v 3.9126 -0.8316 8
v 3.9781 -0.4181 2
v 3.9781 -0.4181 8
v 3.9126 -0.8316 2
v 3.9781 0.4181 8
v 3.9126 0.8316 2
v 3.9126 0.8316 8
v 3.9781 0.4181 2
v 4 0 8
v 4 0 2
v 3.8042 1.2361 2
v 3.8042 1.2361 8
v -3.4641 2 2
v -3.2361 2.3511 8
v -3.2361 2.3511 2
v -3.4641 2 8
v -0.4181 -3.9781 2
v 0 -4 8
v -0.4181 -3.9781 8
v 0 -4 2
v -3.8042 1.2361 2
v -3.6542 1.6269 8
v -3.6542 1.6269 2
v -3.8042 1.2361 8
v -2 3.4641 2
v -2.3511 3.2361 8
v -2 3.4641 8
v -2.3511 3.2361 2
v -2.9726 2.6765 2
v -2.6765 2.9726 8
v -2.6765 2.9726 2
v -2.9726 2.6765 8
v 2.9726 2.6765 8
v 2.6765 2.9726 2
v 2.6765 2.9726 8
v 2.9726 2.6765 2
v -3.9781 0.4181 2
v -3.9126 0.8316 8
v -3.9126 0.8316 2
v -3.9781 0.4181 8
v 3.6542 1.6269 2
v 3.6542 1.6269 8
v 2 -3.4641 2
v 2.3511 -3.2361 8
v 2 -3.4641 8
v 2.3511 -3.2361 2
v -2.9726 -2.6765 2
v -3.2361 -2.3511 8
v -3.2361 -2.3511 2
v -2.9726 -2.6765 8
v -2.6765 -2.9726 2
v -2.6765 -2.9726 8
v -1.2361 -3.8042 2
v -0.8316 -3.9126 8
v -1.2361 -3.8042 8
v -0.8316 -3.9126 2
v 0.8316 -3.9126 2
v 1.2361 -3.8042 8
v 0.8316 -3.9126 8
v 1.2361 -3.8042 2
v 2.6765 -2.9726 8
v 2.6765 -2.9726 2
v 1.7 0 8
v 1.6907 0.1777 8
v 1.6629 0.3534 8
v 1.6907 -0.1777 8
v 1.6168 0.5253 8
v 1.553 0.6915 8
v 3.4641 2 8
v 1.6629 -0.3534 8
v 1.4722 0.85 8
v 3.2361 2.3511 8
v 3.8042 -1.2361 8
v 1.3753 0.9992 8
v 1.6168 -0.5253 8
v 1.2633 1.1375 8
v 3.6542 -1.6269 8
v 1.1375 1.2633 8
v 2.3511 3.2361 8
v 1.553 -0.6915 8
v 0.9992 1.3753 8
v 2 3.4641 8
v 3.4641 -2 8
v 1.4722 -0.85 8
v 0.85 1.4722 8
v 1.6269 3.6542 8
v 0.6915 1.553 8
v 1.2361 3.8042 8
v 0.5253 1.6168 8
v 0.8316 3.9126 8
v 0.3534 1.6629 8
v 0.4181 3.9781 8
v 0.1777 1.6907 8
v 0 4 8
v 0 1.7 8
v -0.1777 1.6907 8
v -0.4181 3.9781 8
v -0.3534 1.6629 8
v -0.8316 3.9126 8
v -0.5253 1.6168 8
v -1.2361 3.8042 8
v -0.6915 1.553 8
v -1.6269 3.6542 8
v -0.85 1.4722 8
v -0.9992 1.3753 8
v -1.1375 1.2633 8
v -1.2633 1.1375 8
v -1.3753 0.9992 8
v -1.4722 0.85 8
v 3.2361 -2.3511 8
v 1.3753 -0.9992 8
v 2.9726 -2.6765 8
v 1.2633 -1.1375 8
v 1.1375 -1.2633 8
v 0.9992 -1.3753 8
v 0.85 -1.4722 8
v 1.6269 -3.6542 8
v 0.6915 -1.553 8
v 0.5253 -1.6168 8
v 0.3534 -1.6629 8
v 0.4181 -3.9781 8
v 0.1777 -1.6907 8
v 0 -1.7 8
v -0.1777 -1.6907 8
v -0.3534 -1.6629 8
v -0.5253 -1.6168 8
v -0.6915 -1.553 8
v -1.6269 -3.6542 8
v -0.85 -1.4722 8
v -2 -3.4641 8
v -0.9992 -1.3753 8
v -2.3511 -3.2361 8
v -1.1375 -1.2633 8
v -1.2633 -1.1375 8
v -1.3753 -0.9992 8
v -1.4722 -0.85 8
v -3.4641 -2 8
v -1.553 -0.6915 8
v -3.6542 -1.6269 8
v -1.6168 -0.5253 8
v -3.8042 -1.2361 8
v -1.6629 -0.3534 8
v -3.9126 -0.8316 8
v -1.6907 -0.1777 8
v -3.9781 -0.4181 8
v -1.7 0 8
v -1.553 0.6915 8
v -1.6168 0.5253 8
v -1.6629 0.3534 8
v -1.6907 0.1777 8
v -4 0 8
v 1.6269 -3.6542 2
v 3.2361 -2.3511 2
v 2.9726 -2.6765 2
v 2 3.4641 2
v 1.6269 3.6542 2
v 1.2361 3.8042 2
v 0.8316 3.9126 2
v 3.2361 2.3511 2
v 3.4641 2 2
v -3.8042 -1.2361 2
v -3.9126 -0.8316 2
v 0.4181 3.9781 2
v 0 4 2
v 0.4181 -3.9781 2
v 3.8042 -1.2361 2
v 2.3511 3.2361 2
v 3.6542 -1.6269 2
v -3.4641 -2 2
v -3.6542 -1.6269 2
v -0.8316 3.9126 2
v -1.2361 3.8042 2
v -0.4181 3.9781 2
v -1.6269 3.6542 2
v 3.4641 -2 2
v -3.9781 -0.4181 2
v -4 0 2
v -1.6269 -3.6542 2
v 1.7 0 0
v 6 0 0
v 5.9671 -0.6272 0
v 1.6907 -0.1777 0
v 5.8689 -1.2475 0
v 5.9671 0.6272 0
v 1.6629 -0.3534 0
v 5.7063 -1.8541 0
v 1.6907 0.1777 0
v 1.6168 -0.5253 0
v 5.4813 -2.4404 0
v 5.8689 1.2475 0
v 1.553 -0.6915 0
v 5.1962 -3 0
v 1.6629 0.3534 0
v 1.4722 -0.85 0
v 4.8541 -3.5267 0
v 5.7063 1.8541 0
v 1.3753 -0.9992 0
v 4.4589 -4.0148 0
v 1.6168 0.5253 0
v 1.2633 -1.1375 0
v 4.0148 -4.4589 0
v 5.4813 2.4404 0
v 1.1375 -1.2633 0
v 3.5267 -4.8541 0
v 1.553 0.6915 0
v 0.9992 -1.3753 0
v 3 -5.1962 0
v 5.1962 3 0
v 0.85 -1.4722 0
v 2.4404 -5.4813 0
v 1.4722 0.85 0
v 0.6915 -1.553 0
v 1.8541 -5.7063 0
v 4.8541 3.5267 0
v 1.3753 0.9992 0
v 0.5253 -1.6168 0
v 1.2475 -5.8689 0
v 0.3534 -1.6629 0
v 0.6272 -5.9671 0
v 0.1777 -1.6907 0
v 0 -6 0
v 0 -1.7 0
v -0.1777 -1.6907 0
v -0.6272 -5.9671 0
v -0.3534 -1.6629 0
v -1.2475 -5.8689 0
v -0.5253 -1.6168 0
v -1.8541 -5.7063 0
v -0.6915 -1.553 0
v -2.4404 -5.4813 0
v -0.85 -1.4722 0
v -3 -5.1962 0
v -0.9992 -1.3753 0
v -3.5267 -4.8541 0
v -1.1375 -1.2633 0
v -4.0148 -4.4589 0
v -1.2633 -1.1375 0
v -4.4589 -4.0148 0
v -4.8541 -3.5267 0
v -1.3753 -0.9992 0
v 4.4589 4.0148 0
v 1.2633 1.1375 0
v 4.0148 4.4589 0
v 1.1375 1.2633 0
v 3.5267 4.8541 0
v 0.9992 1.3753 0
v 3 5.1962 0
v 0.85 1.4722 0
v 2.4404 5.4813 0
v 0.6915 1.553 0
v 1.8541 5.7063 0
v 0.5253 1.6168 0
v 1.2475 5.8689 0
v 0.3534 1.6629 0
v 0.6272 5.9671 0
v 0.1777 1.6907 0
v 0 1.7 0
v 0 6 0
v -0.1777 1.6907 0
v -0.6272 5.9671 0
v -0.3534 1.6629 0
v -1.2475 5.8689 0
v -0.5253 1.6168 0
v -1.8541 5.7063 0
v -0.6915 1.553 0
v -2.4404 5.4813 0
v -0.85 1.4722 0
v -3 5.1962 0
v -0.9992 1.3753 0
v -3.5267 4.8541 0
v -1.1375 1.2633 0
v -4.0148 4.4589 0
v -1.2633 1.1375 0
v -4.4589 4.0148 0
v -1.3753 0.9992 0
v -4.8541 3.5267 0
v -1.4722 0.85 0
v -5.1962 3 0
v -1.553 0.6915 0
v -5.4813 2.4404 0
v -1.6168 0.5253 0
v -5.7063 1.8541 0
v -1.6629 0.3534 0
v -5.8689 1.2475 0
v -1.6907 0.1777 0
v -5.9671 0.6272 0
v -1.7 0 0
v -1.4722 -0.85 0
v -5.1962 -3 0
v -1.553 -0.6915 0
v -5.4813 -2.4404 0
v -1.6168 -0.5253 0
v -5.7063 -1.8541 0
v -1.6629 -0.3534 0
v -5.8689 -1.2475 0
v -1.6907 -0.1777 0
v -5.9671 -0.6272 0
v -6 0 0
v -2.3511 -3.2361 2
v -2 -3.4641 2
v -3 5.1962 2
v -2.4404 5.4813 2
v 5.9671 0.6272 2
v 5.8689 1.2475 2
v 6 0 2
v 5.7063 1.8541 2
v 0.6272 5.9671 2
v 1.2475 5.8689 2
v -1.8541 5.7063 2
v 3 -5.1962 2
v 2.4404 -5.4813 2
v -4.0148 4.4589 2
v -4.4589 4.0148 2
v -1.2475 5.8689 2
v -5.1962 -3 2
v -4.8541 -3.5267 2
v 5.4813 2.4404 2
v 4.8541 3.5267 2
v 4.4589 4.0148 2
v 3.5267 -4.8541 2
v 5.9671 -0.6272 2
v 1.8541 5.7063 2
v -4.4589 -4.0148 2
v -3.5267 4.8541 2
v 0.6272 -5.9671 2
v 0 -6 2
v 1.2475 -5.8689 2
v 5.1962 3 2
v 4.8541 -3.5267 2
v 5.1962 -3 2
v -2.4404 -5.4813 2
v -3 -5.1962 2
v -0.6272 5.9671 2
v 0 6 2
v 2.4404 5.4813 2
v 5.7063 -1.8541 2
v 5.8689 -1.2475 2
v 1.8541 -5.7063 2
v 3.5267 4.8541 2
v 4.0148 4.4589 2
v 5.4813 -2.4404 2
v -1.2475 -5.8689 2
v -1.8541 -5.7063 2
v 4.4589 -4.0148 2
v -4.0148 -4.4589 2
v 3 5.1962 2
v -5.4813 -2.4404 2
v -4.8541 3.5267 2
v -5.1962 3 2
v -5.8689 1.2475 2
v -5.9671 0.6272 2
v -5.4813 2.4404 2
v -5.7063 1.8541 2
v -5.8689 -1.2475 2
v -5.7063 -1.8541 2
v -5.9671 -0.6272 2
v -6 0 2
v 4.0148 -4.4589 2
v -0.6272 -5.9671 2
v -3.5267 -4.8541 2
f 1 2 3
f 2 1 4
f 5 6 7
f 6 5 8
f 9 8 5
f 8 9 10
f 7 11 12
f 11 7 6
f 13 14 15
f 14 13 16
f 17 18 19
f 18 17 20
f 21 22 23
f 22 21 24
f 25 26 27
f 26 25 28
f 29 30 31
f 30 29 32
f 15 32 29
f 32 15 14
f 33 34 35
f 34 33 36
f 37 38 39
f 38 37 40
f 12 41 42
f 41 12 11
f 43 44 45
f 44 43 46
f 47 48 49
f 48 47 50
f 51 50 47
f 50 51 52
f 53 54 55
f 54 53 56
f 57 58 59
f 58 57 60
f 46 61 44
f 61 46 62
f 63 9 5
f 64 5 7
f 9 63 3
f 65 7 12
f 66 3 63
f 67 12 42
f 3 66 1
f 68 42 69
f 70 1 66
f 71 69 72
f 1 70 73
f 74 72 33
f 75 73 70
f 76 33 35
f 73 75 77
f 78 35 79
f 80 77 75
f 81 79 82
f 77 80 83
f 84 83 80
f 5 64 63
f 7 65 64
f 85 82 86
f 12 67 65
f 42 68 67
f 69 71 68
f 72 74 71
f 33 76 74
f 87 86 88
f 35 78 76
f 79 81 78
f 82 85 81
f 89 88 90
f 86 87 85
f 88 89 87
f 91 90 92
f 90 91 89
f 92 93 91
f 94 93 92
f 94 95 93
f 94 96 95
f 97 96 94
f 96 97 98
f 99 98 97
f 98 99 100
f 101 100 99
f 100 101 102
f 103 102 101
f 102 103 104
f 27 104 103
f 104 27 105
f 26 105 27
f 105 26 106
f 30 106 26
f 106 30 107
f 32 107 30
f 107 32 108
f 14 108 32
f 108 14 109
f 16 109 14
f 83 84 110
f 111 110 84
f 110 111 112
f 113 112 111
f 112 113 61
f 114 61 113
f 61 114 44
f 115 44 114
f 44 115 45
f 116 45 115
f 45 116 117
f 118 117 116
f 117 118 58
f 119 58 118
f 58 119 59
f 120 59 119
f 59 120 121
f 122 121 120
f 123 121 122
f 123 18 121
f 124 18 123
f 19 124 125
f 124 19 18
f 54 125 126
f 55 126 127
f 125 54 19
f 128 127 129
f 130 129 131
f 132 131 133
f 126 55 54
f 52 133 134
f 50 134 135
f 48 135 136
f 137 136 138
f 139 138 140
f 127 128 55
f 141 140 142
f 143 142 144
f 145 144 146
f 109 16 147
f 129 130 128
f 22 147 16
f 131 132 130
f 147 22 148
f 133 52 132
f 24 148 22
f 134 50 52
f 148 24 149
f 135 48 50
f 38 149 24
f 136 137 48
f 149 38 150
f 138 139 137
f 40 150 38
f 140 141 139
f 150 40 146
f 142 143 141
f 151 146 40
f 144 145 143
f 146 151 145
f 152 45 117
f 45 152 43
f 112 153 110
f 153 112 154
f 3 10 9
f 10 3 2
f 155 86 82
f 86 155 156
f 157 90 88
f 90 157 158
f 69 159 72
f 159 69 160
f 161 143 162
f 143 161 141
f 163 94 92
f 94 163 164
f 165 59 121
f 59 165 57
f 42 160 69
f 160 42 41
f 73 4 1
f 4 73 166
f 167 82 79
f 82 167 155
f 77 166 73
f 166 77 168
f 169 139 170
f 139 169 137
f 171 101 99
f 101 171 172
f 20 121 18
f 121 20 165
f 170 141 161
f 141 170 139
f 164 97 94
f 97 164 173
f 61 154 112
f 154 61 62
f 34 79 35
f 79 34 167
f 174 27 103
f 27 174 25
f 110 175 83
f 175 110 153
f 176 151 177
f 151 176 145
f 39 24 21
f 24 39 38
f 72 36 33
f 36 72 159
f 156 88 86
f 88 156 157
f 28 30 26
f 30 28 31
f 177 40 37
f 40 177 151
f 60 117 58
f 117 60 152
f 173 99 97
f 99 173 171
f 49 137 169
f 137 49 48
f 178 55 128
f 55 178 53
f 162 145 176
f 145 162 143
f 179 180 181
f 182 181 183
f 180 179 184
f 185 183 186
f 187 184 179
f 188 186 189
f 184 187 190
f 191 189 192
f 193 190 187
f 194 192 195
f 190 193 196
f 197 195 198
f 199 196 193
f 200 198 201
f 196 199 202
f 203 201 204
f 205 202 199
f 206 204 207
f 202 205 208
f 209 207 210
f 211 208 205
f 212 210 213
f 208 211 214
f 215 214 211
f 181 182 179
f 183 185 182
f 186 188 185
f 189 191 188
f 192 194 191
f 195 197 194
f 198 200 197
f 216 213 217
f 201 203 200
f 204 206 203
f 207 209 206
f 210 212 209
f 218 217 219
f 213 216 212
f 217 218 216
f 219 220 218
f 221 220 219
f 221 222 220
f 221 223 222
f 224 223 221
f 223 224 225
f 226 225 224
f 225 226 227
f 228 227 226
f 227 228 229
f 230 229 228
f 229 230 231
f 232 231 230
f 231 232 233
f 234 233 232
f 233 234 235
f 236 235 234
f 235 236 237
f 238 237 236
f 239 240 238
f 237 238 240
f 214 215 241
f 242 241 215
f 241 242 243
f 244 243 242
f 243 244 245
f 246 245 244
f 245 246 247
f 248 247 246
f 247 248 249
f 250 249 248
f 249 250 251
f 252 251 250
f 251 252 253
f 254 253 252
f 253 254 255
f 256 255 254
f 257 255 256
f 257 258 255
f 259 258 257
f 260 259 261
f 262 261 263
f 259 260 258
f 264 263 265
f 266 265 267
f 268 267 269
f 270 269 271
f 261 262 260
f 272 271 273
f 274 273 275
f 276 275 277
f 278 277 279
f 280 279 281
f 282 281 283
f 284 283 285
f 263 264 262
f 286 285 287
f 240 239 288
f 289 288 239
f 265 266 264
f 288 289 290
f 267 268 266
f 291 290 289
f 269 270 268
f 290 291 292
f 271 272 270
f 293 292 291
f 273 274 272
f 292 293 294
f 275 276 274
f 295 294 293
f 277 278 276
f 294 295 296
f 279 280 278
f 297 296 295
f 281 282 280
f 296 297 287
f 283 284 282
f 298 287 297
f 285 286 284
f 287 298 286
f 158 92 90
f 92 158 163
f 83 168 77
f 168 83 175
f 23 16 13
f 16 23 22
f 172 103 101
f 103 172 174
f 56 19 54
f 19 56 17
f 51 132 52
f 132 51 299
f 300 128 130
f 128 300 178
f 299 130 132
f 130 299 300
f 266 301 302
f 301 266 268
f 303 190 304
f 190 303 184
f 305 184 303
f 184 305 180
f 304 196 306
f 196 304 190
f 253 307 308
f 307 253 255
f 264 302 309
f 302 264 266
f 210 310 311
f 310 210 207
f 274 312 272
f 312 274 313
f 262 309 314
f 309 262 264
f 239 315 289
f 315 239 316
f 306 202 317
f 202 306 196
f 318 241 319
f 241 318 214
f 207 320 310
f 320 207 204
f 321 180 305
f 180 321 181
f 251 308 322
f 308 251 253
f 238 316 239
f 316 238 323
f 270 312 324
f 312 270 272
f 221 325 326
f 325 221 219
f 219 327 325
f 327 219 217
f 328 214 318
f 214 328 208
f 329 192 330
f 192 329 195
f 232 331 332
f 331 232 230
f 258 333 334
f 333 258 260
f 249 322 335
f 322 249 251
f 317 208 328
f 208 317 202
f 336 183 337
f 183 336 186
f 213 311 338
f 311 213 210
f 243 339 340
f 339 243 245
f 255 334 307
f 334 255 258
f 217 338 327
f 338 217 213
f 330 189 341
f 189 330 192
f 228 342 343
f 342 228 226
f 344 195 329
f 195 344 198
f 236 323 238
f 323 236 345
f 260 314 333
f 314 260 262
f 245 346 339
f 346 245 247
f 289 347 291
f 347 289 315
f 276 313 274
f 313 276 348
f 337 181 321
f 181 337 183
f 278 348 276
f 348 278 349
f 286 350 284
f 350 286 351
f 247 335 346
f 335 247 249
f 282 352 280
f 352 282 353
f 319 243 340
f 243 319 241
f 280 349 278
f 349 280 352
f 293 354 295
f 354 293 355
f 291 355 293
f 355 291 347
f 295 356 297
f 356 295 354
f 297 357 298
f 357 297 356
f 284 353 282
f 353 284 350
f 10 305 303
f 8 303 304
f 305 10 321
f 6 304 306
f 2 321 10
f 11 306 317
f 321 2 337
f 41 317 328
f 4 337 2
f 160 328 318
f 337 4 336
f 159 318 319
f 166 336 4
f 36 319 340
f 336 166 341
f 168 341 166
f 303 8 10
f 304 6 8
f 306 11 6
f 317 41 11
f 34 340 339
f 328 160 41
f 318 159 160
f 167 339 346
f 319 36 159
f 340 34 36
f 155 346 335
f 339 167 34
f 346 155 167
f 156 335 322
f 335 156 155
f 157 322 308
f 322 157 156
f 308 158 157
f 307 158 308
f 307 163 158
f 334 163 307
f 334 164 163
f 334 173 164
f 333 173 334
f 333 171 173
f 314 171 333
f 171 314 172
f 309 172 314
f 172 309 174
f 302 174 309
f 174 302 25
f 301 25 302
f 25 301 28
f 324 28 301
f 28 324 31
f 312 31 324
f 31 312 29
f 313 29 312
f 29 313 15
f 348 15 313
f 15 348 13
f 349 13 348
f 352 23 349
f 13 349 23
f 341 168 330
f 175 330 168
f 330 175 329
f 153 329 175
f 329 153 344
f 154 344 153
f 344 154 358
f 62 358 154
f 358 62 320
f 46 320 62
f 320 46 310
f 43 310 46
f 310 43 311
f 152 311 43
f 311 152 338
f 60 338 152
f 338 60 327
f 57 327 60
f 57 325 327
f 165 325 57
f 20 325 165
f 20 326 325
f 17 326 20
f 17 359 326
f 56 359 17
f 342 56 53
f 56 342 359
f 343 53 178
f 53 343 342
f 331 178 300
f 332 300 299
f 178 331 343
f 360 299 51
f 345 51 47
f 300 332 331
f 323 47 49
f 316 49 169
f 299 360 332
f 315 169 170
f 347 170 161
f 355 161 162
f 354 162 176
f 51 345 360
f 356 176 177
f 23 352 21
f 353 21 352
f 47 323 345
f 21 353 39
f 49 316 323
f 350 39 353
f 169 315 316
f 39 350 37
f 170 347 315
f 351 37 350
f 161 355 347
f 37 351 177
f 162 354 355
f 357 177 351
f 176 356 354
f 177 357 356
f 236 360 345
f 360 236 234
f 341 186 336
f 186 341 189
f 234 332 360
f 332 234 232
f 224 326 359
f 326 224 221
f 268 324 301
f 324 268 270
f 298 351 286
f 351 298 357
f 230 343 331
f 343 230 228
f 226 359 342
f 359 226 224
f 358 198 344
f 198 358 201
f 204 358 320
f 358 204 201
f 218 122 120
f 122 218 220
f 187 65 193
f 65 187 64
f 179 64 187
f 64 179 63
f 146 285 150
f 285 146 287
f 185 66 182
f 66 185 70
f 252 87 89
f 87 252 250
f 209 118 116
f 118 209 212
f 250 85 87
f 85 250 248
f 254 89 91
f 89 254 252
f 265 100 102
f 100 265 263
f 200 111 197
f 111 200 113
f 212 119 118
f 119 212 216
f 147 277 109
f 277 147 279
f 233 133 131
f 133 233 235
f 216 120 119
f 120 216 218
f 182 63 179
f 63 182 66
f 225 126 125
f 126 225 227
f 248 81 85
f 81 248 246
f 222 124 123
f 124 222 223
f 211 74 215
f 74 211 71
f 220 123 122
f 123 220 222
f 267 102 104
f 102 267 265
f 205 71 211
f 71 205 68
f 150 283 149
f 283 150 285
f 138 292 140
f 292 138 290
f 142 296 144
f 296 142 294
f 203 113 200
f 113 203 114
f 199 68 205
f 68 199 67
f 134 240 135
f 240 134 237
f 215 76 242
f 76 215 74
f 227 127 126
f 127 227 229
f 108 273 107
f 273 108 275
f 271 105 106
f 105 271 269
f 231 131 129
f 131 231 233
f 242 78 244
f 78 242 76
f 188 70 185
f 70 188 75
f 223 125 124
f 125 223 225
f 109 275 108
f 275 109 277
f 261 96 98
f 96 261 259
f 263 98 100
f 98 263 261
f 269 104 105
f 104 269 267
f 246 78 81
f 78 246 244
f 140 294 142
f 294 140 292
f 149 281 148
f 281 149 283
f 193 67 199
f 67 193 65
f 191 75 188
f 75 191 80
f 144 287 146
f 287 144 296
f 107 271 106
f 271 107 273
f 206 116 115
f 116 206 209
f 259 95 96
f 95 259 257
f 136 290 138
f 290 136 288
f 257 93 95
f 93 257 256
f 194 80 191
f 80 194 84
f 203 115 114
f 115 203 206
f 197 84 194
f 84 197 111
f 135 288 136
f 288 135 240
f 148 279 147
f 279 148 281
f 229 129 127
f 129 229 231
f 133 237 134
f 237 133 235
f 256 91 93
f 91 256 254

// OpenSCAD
// Motor mounting standoff.
$fn = 60;
eps = 0.02;
thread_d = 3.4;
outer_d = 8;
length = 8;
difference() {
    union() { cylinder(d=outer_d,h=length); cylinder(d=outer_d+4,h=2); }
    translate([0,0,-eps]) cylinder(d=thread_d,h=length+2*eps);
}
